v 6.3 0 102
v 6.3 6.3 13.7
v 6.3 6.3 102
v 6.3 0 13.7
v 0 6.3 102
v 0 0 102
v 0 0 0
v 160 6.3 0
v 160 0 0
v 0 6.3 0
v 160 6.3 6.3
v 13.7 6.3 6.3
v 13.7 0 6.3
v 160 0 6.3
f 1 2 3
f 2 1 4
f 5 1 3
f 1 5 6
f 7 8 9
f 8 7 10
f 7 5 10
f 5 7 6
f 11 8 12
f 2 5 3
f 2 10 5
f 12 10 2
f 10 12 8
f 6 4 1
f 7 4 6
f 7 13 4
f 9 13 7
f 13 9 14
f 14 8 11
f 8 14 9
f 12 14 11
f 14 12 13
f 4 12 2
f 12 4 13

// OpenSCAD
// file: ../libraries/triangles.scad
/**
 * Simple triangles library
 * https://raw.githubusercontent.com/openscad/MCAD/master/triangles.scad
 * Authors:
 *   - Eero 'rambo' af Heurlin 2010-
 *
 * License: LGPL 2.1
 */


/**
 * Standard right-angled triangle
 *
 * @param number  o_len  Length of the opposite side
 * @param number  a_len  Length of the adjacent side
 * @param number  depth  How wide/deep the triangle is in the 3rd dimension
 * @param boolean center Whether to center the triangle on the origin
 * @todo a better way ?
 */
module triangle(o_len, a_len, depth, center=false)
{
    centroid = center ? [-a_len/3, -o_len/3, -depth/2] : [0, 0, 0];
    translate(centroid) linear_extrude(height=depth)
    {
        polygon(points=[[0,0],[a_len,0],[0,o_len]], paths=[[0,1,2]]);
    }
}

/**
 * Standard right-angled triangle (tangent version)
 *
 * @param number  tan_angle Angle of adjacent to hypotenuse (ie tangent)
 * @param number  a_len     Length of the adjacent side
 * @param number  depth     How wide/deep the triangle is in the 3rd dimension
 * @param boolean center    Whether to center the triangle on the origin
 */
module a_triangle(tan_angle, a_len, depth, center=false)
{
    triangle(tan(tan_angle) * a_len, a_len, depth, center);
}

// Tests:
module test_triangle() { triangle(5, 5, 5); }
module test_a_triangle() { a_triangle(45, 5, 5); }
module test_triangles()
{
    // Generate a bunch of triangles by sizes
    for (i = [1:10])
    {
        translate([i*7, -30, i*7])
        {
            triangle(i*5, sqrt(i*5+pow(i,2)), 5);
        }
    }

    // Generate a bunch of triangles by angle
    for (i = [1:85/5])
    {
        translate([i*7, 22, i*7])
        {
            a_triangle(i*5, 10, 5);
        }
    }
}
// main file
use <../libraries/triangles.scad>

cube([6.3, 6.3, 102]);
translate([0,0,6.3]){
  rotate([0,90,0]){
    cube([6.3, 6.3, 160]);
  }
}

translate([0,6.3,0]){
  rotate([90,0,0]){
    triangle(20, 20, 6.3);
  }
}
